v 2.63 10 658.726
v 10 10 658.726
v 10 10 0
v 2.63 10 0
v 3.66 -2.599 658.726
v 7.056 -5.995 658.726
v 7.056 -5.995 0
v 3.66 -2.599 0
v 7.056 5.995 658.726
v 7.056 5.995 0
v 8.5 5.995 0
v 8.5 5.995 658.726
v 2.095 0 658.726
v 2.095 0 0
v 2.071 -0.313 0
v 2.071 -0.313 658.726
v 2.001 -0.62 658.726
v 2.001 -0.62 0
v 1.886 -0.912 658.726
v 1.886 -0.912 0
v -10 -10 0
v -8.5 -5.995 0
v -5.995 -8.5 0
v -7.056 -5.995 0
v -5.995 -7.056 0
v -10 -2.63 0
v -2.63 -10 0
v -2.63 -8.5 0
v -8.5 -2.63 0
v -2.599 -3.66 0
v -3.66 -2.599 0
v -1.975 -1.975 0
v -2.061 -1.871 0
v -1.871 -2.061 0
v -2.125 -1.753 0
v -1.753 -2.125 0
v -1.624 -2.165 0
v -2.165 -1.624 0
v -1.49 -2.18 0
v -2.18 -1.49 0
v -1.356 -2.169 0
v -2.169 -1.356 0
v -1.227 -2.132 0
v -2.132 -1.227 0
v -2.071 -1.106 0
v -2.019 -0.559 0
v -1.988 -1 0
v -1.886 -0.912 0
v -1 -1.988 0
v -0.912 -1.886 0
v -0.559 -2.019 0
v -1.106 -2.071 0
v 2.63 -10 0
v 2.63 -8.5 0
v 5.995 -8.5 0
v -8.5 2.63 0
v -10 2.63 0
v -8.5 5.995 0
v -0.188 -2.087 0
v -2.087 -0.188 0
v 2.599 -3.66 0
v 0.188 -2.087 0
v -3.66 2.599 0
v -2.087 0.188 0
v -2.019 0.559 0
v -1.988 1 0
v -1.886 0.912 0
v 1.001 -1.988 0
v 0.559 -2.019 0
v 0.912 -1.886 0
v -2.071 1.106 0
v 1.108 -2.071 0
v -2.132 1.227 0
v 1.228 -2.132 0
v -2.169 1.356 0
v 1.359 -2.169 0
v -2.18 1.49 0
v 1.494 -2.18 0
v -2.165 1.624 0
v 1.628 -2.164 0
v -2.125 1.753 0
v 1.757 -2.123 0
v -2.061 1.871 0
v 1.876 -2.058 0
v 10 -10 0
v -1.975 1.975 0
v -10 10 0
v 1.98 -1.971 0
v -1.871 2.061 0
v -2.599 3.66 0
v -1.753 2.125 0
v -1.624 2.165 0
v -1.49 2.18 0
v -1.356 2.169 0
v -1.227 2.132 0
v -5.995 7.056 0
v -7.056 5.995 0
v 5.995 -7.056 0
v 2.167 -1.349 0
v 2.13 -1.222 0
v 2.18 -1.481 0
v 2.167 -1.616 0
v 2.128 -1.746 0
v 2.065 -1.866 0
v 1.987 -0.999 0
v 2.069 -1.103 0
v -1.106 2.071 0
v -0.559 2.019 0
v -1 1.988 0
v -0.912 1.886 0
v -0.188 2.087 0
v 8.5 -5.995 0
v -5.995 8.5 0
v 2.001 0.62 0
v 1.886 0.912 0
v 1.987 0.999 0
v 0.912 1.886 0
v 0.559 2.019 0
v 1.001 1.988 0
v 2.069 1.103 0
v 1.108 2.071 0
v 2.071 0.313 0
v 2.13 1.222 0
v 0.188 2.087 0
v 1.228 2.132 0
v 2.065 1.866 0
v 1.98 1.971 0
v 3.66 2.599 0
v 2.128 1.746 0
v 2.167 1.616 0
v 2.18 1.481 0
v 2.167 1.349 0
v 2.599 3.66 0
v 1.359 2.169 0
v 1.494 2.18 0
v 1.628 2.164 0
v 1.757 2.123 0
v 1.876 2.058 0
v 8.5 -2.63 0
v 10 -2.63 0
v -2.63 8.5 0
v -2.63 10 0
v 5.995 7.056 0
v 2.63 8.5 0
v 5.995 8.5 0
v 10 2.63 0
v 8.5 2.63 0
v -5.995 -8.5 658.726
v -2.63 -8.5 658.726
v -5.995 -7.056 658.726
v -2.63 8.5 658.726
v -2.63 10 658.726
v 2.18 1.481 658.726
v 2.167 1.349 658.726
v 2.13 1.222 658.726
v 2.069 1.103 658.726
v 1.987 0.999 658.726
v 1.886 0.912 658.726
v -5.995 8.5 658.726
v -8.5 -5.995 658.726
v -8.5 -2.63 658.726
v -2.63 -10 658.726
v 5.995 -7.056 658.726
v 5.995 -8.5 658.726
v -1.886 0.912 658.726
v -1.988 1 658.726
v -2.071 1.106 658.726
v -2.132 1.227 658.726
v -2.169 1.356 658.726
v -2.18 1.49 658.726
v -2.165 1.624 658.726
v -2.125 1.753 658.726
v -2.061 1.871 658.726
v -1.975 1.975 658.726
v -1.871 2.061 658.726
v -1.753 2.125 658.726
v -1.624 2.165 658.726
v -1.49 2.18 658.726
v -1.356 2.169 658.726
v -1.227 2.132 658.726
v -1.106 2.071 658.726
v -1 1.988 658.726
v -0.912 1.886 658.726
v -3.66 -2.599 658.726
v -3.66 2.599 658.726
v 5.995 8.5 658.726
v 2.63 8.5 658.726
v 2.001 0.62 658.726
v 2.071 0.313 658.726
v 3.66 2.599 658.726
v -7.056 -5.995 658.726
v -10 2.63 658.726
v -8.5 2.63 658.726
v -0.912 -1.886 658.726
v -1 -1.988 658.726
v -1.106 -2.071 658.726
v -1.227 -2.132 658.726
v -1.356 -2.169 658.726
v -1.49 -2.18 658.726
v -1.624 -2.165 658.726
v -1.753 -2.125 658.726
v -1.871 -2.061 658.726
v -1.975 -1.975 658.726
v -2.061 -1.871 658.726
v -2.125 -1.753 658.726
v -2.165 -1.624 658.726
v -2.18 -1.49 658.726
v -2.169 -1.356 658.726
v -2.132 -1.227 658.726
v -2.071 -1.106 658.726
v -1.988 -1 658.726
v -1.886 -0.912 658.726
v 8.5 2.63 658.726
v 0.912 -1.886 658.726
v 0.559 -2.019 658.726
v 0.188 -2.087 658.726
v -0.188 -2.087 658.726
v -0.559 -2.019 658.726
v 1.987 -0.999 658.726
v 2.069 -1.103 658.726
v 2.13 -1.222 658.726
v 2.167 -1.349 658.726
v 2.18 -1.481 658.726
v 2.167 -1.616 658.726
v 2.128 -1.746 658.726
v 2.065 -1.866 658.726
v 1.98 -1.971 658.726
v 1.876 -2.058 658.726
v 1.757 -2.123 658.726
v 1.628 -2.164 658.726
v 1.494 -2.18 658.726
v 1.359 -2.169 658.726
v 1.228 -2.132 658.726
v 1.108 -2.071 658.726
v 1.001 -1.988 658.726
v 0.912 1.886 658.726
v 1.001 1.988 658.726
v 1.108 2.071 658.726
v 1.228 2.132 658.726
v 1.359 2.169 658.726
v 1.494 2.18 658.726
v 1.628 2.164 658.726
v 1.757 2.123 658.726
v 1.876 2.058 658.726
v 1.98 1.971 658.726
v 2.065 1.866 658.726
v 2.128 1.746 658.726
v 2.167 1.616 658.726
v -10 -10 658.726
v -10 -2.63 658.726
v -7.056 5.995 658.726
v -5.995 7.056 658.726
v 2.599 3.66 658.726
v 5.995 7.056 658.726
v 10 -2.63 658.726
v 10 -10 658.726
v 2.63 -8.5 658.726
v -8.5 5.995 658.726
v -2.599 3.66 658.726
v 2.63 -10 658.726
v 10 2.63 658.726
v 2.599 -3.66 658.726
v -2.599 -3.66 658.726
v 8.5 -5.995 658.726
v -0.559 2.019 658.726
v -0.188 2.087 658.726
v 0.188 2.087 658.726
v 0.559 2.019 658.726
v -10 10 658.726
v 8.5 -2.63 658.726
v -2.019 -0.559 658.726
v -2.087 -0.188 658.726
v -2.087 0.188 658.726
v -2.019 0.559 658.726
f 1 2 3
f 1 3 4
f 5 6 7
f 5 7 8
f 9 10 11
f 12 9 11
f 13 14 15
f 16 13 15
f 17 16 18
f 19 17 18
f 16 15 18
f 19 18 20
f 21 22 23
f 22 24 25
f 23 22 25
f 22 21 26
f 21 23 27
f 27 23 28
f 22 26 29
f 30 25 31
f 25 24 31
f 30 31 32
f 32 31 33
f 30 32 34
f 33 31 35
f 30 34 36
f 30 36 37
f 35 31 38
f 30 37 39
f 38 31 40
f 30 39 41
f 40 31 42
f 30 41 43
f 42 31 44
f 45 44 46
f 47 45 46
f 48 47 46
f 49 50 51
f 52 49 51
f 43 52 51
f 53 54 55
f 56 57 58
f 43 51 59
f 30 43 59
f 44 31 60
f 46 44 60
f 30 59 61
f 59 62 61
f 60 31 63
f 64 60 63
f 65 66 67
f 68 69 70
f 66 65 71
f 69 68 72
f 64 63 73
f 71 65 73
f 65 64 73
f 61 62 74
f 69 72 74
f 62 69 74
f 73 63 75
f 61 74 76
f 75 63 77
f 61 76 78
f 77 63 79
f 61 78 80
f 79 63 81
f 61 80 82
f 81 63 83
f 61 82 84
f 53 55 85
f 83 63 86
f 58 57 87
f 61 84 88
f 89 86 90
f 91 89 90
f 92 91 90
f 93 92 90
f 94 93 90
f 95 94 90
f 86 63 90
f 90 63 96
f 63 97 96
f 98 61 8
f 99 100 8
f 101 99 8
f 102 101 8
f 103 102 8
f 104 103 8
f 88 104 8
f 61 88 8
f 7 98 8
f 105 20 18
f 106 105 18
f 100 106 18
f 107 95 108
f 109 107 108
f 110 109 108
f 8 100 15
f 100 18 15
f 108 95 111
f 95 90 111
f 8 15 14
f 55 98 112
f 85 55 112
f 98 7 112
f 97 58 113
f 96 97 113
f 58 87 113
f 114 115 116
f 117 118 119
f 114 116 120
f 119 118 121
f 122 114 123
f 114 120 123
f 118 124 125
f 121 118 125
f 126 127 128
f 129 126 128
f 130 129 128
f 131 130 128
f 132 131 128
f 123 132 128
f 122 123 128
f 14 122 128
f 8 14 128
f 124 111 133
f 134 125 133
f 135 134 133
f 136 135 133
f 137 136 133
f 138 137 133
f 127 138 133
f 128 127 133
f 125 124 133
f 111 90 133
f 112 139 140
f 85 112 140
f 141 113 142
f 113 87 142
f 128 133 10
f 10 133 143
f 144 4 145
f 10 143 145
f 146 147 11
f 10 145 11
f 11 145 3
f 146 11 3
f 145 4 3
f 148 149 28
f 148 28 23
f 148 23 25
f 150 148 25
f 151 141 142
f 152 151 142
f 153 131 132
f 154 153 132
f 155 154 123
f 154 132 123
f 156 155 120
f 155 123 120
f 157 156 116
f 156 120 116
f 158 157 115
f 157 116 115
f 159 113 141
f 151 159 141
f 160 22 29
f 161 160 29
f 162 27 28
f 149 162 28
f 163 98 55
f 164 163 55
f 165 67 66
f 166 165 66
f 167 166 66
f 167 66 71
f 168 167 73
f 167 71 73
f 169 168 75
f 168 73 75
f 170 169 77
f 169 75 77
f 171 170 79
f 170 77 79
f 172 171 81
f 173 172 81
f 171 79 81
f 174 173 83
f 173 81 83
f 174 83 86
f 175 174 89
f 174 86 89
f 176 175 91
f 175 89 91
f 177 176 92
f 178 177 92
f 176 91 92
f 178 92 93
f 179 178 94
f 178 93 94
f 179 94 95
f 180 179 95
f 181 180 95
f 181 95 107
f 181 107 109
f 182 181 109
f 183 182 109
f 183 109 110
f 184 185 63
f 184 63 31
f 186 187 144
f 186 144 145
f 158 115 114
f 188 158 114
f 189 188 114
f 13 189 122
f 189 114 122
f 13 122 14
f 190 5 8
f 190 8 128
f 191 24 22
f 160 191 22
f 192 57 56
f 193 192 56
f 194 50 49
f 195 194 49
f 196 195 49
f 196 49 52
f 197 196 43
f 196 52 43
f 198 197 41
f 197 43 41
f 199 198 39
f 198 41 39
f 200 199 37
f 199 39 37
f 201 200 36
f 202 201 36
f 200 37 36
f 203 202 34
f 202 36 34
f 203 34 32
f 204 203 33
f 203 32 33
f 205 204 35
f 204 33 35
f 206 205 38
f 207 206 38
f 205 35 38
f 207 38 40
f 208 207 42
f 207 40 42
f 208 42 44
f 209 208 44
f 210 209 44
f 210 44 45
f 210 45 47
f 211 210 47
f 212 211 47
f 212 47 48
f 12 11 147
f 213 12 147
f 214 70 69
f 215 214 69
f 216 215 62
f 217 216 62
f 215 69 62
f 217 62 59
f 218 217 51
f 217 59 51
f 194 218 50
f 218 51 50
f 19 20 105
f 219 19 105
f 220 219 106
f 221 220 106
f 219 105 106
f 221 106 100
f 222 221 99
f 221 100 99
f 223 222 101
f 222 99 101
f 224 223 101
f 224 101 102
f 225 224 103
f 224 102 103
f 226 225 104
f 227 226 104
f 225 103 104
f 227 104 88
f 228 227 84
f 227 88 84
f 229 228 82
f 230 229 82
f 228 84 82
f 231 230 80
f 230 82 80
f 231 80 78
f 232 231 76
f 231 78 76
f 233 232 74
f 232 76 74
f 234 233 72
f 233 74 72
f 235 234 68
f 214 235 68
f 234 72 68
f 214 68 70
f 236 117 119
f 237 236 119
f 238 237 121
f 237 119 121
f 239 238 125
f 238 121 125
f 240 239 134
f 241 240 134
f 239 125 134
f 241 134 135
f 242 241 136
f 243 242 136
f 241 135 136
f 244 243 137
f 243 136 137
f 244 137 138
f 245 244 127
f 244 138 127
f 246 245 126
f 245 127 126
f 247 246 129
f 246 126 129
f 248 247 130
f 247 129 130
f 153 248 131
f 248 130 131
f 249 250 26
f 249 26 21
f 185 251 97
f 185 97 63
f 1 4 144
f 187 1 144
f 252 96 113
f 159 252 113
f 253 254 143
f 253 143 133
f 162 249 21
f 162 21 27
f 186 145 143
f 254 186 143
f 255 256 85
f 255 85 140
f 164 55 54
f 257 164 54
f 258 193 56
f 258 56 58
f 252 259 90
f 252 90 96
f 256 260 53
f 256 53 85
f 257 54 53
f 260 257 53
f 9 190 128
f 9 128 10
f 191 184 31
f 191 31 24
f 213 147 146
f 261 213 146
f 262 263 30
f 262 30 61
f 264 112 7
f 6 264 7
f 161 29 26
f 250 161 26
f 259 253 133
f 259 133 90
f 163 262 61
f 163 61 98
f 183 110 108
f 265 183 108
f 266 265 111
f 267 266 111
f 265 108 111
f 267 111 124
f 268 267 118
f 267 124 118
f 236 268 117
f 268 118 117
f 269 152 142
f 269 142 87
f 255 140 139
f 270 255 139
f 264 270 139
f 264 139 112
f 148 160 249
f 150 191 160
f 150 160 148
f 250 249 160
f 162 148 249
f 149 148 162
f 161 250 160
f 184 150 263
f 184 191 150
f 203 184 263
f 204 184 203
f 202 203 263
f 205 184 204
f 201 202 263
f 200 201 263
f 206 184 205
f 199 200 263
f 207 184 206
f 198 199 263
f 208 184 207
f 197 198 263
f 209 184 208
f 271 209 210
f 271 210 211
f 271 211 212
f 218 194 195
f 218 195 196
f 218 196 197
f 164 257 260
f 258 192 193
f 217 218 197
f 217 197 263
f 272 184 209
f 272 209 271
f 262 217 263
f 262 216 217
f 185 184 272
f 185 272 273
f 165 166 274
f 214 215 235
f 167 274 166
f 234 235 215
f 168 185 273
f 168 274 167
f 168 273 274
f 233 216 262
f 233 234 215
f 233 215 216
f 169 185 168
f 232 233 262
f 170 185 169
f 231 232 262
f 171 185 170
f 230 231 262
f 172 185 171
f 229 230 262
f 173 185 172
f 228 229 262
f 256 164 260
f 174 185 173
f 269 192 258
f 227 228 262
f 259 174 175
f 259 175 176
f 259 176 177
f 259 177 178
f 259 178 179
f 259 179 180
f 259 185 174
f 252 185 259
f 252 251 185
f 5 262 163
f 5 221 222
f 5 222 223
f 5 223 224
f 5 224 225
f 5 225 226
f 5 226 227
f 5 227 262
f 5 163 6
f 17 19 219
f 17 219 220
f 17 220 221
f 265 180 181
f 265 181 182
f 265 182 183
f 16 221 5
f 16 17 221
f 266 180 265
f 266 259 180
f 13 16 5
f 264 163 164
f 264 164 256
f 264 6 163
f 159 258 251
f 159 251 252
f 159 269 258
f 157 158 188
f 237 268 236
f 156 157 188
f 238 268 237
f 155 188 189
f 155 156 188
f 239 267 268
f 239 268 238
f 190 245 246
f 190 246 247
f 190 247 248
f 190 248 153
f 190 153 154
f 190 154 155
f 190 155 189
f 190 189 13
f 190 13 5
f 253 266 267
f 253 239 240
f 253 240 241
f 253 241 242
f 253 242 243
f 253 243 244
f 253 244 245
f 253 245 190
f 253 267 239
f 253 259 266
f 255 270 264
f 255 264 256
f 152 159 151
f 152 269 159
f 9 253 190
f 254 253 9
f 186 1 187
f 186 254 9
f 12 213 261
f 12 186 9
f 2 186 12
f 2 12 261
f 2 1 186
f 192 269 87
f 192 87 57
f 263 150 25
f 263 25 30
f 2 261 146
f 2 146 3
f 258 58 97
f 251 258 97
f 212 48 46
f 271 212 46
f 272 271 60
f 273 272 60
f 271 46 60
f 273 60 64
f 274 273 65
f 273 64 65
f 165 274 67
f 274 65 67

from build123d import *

# Parameters (mm, degrees)
F1_DEPTH = 658.726


with BuildPart() as f1:
    # F0 (on Top) → F1 (new body)
    with BuildSketch(Plane.XY):
        Polygon((10, 2.63), (10, 10), (2.63, 10), (2.63, 8.5), (5.995, 8.5), (5.995, 7.05566), (2.59934, 3.66), (-2.59934, 3.66), (-5.995, 7.05566), (-5.995, 8.5), (-2.63, 8.5), (-2.63, 10), (-10, 10), (-10, 2.63), (-8.5, 2.63), (-8.5, 5.995), (-7.05566, 5.995), (-3.66, 2.59934), (-3.66, -2.59934), (-7.05566, -5.995), (-8.5, -5.995), (-8.5, -2.63), (-10, -2.63), (-10, -10), (-2.63, -10), (-2.63, -8.5), (-5.995, -8.5), (-5.995, -7.05566), (-2.59934, -3.66), (2.59934, -3.66), (5.995, -7.05566), (5.995, -8.5), (2.63, -8.5), (2.63, -10), (10, -10), (10, -2.63), (8.5, -2.63), (8.5, -5.995), (7.05566, -5.995), (3.66, -2.59934), (3.66, 2.59934), (7.05566, 5.995), (8.5, 5.995), (8.5, 2.63), align=None)
        with BuildLine():
            ThreePointArc((1.886053, 0.912048), (2.042095, 0.467838), (2.095, 0))
            ThreePointArc((2.095, 0), (2.042095, -0.467838), (1.886053, -0.912048))
            ThreePointArc((1.886053, -0.912048), (2.102098, -1.161042), (2.179889, -1.481389))
            ThreePointArc((2.179889, -1.481389), (1.693777, -2.146816), (0.912048, -1.886053))
            ThreePointArc((0.912048, -1.886053), (0, -2.095), (-0.912048, -1.886053))
            ThreePointArc((-0.912048, -1.886053), (-1.975303, -1.975303), (-1.886053, -0.912048))
            ThreePointArc((-1.886053, -0.912048), (-2.095, 0), (-1.886053, 0.912048))
            ThreePointArc((-1.886053, 0.912048), (-1.975303, 1.975303), (-0.912048, 1.886053))
            ThreePointArc((-0.912048, 1.886053), (0, 2.095), (0.912048, 1.886053))
            ThreePointArc((0.912048, 1.886053), (1.693777, 2.146816), (2.179889, 1.481389))
            ThreePointArc((2.179889, 1.481389), (2.102098, 1.161042), (1.886053, 0.912048))
        make_face(mode=Mode.SUBTRACT)
    extrude(amount=F1_DEPTH)


solid = f1.part
